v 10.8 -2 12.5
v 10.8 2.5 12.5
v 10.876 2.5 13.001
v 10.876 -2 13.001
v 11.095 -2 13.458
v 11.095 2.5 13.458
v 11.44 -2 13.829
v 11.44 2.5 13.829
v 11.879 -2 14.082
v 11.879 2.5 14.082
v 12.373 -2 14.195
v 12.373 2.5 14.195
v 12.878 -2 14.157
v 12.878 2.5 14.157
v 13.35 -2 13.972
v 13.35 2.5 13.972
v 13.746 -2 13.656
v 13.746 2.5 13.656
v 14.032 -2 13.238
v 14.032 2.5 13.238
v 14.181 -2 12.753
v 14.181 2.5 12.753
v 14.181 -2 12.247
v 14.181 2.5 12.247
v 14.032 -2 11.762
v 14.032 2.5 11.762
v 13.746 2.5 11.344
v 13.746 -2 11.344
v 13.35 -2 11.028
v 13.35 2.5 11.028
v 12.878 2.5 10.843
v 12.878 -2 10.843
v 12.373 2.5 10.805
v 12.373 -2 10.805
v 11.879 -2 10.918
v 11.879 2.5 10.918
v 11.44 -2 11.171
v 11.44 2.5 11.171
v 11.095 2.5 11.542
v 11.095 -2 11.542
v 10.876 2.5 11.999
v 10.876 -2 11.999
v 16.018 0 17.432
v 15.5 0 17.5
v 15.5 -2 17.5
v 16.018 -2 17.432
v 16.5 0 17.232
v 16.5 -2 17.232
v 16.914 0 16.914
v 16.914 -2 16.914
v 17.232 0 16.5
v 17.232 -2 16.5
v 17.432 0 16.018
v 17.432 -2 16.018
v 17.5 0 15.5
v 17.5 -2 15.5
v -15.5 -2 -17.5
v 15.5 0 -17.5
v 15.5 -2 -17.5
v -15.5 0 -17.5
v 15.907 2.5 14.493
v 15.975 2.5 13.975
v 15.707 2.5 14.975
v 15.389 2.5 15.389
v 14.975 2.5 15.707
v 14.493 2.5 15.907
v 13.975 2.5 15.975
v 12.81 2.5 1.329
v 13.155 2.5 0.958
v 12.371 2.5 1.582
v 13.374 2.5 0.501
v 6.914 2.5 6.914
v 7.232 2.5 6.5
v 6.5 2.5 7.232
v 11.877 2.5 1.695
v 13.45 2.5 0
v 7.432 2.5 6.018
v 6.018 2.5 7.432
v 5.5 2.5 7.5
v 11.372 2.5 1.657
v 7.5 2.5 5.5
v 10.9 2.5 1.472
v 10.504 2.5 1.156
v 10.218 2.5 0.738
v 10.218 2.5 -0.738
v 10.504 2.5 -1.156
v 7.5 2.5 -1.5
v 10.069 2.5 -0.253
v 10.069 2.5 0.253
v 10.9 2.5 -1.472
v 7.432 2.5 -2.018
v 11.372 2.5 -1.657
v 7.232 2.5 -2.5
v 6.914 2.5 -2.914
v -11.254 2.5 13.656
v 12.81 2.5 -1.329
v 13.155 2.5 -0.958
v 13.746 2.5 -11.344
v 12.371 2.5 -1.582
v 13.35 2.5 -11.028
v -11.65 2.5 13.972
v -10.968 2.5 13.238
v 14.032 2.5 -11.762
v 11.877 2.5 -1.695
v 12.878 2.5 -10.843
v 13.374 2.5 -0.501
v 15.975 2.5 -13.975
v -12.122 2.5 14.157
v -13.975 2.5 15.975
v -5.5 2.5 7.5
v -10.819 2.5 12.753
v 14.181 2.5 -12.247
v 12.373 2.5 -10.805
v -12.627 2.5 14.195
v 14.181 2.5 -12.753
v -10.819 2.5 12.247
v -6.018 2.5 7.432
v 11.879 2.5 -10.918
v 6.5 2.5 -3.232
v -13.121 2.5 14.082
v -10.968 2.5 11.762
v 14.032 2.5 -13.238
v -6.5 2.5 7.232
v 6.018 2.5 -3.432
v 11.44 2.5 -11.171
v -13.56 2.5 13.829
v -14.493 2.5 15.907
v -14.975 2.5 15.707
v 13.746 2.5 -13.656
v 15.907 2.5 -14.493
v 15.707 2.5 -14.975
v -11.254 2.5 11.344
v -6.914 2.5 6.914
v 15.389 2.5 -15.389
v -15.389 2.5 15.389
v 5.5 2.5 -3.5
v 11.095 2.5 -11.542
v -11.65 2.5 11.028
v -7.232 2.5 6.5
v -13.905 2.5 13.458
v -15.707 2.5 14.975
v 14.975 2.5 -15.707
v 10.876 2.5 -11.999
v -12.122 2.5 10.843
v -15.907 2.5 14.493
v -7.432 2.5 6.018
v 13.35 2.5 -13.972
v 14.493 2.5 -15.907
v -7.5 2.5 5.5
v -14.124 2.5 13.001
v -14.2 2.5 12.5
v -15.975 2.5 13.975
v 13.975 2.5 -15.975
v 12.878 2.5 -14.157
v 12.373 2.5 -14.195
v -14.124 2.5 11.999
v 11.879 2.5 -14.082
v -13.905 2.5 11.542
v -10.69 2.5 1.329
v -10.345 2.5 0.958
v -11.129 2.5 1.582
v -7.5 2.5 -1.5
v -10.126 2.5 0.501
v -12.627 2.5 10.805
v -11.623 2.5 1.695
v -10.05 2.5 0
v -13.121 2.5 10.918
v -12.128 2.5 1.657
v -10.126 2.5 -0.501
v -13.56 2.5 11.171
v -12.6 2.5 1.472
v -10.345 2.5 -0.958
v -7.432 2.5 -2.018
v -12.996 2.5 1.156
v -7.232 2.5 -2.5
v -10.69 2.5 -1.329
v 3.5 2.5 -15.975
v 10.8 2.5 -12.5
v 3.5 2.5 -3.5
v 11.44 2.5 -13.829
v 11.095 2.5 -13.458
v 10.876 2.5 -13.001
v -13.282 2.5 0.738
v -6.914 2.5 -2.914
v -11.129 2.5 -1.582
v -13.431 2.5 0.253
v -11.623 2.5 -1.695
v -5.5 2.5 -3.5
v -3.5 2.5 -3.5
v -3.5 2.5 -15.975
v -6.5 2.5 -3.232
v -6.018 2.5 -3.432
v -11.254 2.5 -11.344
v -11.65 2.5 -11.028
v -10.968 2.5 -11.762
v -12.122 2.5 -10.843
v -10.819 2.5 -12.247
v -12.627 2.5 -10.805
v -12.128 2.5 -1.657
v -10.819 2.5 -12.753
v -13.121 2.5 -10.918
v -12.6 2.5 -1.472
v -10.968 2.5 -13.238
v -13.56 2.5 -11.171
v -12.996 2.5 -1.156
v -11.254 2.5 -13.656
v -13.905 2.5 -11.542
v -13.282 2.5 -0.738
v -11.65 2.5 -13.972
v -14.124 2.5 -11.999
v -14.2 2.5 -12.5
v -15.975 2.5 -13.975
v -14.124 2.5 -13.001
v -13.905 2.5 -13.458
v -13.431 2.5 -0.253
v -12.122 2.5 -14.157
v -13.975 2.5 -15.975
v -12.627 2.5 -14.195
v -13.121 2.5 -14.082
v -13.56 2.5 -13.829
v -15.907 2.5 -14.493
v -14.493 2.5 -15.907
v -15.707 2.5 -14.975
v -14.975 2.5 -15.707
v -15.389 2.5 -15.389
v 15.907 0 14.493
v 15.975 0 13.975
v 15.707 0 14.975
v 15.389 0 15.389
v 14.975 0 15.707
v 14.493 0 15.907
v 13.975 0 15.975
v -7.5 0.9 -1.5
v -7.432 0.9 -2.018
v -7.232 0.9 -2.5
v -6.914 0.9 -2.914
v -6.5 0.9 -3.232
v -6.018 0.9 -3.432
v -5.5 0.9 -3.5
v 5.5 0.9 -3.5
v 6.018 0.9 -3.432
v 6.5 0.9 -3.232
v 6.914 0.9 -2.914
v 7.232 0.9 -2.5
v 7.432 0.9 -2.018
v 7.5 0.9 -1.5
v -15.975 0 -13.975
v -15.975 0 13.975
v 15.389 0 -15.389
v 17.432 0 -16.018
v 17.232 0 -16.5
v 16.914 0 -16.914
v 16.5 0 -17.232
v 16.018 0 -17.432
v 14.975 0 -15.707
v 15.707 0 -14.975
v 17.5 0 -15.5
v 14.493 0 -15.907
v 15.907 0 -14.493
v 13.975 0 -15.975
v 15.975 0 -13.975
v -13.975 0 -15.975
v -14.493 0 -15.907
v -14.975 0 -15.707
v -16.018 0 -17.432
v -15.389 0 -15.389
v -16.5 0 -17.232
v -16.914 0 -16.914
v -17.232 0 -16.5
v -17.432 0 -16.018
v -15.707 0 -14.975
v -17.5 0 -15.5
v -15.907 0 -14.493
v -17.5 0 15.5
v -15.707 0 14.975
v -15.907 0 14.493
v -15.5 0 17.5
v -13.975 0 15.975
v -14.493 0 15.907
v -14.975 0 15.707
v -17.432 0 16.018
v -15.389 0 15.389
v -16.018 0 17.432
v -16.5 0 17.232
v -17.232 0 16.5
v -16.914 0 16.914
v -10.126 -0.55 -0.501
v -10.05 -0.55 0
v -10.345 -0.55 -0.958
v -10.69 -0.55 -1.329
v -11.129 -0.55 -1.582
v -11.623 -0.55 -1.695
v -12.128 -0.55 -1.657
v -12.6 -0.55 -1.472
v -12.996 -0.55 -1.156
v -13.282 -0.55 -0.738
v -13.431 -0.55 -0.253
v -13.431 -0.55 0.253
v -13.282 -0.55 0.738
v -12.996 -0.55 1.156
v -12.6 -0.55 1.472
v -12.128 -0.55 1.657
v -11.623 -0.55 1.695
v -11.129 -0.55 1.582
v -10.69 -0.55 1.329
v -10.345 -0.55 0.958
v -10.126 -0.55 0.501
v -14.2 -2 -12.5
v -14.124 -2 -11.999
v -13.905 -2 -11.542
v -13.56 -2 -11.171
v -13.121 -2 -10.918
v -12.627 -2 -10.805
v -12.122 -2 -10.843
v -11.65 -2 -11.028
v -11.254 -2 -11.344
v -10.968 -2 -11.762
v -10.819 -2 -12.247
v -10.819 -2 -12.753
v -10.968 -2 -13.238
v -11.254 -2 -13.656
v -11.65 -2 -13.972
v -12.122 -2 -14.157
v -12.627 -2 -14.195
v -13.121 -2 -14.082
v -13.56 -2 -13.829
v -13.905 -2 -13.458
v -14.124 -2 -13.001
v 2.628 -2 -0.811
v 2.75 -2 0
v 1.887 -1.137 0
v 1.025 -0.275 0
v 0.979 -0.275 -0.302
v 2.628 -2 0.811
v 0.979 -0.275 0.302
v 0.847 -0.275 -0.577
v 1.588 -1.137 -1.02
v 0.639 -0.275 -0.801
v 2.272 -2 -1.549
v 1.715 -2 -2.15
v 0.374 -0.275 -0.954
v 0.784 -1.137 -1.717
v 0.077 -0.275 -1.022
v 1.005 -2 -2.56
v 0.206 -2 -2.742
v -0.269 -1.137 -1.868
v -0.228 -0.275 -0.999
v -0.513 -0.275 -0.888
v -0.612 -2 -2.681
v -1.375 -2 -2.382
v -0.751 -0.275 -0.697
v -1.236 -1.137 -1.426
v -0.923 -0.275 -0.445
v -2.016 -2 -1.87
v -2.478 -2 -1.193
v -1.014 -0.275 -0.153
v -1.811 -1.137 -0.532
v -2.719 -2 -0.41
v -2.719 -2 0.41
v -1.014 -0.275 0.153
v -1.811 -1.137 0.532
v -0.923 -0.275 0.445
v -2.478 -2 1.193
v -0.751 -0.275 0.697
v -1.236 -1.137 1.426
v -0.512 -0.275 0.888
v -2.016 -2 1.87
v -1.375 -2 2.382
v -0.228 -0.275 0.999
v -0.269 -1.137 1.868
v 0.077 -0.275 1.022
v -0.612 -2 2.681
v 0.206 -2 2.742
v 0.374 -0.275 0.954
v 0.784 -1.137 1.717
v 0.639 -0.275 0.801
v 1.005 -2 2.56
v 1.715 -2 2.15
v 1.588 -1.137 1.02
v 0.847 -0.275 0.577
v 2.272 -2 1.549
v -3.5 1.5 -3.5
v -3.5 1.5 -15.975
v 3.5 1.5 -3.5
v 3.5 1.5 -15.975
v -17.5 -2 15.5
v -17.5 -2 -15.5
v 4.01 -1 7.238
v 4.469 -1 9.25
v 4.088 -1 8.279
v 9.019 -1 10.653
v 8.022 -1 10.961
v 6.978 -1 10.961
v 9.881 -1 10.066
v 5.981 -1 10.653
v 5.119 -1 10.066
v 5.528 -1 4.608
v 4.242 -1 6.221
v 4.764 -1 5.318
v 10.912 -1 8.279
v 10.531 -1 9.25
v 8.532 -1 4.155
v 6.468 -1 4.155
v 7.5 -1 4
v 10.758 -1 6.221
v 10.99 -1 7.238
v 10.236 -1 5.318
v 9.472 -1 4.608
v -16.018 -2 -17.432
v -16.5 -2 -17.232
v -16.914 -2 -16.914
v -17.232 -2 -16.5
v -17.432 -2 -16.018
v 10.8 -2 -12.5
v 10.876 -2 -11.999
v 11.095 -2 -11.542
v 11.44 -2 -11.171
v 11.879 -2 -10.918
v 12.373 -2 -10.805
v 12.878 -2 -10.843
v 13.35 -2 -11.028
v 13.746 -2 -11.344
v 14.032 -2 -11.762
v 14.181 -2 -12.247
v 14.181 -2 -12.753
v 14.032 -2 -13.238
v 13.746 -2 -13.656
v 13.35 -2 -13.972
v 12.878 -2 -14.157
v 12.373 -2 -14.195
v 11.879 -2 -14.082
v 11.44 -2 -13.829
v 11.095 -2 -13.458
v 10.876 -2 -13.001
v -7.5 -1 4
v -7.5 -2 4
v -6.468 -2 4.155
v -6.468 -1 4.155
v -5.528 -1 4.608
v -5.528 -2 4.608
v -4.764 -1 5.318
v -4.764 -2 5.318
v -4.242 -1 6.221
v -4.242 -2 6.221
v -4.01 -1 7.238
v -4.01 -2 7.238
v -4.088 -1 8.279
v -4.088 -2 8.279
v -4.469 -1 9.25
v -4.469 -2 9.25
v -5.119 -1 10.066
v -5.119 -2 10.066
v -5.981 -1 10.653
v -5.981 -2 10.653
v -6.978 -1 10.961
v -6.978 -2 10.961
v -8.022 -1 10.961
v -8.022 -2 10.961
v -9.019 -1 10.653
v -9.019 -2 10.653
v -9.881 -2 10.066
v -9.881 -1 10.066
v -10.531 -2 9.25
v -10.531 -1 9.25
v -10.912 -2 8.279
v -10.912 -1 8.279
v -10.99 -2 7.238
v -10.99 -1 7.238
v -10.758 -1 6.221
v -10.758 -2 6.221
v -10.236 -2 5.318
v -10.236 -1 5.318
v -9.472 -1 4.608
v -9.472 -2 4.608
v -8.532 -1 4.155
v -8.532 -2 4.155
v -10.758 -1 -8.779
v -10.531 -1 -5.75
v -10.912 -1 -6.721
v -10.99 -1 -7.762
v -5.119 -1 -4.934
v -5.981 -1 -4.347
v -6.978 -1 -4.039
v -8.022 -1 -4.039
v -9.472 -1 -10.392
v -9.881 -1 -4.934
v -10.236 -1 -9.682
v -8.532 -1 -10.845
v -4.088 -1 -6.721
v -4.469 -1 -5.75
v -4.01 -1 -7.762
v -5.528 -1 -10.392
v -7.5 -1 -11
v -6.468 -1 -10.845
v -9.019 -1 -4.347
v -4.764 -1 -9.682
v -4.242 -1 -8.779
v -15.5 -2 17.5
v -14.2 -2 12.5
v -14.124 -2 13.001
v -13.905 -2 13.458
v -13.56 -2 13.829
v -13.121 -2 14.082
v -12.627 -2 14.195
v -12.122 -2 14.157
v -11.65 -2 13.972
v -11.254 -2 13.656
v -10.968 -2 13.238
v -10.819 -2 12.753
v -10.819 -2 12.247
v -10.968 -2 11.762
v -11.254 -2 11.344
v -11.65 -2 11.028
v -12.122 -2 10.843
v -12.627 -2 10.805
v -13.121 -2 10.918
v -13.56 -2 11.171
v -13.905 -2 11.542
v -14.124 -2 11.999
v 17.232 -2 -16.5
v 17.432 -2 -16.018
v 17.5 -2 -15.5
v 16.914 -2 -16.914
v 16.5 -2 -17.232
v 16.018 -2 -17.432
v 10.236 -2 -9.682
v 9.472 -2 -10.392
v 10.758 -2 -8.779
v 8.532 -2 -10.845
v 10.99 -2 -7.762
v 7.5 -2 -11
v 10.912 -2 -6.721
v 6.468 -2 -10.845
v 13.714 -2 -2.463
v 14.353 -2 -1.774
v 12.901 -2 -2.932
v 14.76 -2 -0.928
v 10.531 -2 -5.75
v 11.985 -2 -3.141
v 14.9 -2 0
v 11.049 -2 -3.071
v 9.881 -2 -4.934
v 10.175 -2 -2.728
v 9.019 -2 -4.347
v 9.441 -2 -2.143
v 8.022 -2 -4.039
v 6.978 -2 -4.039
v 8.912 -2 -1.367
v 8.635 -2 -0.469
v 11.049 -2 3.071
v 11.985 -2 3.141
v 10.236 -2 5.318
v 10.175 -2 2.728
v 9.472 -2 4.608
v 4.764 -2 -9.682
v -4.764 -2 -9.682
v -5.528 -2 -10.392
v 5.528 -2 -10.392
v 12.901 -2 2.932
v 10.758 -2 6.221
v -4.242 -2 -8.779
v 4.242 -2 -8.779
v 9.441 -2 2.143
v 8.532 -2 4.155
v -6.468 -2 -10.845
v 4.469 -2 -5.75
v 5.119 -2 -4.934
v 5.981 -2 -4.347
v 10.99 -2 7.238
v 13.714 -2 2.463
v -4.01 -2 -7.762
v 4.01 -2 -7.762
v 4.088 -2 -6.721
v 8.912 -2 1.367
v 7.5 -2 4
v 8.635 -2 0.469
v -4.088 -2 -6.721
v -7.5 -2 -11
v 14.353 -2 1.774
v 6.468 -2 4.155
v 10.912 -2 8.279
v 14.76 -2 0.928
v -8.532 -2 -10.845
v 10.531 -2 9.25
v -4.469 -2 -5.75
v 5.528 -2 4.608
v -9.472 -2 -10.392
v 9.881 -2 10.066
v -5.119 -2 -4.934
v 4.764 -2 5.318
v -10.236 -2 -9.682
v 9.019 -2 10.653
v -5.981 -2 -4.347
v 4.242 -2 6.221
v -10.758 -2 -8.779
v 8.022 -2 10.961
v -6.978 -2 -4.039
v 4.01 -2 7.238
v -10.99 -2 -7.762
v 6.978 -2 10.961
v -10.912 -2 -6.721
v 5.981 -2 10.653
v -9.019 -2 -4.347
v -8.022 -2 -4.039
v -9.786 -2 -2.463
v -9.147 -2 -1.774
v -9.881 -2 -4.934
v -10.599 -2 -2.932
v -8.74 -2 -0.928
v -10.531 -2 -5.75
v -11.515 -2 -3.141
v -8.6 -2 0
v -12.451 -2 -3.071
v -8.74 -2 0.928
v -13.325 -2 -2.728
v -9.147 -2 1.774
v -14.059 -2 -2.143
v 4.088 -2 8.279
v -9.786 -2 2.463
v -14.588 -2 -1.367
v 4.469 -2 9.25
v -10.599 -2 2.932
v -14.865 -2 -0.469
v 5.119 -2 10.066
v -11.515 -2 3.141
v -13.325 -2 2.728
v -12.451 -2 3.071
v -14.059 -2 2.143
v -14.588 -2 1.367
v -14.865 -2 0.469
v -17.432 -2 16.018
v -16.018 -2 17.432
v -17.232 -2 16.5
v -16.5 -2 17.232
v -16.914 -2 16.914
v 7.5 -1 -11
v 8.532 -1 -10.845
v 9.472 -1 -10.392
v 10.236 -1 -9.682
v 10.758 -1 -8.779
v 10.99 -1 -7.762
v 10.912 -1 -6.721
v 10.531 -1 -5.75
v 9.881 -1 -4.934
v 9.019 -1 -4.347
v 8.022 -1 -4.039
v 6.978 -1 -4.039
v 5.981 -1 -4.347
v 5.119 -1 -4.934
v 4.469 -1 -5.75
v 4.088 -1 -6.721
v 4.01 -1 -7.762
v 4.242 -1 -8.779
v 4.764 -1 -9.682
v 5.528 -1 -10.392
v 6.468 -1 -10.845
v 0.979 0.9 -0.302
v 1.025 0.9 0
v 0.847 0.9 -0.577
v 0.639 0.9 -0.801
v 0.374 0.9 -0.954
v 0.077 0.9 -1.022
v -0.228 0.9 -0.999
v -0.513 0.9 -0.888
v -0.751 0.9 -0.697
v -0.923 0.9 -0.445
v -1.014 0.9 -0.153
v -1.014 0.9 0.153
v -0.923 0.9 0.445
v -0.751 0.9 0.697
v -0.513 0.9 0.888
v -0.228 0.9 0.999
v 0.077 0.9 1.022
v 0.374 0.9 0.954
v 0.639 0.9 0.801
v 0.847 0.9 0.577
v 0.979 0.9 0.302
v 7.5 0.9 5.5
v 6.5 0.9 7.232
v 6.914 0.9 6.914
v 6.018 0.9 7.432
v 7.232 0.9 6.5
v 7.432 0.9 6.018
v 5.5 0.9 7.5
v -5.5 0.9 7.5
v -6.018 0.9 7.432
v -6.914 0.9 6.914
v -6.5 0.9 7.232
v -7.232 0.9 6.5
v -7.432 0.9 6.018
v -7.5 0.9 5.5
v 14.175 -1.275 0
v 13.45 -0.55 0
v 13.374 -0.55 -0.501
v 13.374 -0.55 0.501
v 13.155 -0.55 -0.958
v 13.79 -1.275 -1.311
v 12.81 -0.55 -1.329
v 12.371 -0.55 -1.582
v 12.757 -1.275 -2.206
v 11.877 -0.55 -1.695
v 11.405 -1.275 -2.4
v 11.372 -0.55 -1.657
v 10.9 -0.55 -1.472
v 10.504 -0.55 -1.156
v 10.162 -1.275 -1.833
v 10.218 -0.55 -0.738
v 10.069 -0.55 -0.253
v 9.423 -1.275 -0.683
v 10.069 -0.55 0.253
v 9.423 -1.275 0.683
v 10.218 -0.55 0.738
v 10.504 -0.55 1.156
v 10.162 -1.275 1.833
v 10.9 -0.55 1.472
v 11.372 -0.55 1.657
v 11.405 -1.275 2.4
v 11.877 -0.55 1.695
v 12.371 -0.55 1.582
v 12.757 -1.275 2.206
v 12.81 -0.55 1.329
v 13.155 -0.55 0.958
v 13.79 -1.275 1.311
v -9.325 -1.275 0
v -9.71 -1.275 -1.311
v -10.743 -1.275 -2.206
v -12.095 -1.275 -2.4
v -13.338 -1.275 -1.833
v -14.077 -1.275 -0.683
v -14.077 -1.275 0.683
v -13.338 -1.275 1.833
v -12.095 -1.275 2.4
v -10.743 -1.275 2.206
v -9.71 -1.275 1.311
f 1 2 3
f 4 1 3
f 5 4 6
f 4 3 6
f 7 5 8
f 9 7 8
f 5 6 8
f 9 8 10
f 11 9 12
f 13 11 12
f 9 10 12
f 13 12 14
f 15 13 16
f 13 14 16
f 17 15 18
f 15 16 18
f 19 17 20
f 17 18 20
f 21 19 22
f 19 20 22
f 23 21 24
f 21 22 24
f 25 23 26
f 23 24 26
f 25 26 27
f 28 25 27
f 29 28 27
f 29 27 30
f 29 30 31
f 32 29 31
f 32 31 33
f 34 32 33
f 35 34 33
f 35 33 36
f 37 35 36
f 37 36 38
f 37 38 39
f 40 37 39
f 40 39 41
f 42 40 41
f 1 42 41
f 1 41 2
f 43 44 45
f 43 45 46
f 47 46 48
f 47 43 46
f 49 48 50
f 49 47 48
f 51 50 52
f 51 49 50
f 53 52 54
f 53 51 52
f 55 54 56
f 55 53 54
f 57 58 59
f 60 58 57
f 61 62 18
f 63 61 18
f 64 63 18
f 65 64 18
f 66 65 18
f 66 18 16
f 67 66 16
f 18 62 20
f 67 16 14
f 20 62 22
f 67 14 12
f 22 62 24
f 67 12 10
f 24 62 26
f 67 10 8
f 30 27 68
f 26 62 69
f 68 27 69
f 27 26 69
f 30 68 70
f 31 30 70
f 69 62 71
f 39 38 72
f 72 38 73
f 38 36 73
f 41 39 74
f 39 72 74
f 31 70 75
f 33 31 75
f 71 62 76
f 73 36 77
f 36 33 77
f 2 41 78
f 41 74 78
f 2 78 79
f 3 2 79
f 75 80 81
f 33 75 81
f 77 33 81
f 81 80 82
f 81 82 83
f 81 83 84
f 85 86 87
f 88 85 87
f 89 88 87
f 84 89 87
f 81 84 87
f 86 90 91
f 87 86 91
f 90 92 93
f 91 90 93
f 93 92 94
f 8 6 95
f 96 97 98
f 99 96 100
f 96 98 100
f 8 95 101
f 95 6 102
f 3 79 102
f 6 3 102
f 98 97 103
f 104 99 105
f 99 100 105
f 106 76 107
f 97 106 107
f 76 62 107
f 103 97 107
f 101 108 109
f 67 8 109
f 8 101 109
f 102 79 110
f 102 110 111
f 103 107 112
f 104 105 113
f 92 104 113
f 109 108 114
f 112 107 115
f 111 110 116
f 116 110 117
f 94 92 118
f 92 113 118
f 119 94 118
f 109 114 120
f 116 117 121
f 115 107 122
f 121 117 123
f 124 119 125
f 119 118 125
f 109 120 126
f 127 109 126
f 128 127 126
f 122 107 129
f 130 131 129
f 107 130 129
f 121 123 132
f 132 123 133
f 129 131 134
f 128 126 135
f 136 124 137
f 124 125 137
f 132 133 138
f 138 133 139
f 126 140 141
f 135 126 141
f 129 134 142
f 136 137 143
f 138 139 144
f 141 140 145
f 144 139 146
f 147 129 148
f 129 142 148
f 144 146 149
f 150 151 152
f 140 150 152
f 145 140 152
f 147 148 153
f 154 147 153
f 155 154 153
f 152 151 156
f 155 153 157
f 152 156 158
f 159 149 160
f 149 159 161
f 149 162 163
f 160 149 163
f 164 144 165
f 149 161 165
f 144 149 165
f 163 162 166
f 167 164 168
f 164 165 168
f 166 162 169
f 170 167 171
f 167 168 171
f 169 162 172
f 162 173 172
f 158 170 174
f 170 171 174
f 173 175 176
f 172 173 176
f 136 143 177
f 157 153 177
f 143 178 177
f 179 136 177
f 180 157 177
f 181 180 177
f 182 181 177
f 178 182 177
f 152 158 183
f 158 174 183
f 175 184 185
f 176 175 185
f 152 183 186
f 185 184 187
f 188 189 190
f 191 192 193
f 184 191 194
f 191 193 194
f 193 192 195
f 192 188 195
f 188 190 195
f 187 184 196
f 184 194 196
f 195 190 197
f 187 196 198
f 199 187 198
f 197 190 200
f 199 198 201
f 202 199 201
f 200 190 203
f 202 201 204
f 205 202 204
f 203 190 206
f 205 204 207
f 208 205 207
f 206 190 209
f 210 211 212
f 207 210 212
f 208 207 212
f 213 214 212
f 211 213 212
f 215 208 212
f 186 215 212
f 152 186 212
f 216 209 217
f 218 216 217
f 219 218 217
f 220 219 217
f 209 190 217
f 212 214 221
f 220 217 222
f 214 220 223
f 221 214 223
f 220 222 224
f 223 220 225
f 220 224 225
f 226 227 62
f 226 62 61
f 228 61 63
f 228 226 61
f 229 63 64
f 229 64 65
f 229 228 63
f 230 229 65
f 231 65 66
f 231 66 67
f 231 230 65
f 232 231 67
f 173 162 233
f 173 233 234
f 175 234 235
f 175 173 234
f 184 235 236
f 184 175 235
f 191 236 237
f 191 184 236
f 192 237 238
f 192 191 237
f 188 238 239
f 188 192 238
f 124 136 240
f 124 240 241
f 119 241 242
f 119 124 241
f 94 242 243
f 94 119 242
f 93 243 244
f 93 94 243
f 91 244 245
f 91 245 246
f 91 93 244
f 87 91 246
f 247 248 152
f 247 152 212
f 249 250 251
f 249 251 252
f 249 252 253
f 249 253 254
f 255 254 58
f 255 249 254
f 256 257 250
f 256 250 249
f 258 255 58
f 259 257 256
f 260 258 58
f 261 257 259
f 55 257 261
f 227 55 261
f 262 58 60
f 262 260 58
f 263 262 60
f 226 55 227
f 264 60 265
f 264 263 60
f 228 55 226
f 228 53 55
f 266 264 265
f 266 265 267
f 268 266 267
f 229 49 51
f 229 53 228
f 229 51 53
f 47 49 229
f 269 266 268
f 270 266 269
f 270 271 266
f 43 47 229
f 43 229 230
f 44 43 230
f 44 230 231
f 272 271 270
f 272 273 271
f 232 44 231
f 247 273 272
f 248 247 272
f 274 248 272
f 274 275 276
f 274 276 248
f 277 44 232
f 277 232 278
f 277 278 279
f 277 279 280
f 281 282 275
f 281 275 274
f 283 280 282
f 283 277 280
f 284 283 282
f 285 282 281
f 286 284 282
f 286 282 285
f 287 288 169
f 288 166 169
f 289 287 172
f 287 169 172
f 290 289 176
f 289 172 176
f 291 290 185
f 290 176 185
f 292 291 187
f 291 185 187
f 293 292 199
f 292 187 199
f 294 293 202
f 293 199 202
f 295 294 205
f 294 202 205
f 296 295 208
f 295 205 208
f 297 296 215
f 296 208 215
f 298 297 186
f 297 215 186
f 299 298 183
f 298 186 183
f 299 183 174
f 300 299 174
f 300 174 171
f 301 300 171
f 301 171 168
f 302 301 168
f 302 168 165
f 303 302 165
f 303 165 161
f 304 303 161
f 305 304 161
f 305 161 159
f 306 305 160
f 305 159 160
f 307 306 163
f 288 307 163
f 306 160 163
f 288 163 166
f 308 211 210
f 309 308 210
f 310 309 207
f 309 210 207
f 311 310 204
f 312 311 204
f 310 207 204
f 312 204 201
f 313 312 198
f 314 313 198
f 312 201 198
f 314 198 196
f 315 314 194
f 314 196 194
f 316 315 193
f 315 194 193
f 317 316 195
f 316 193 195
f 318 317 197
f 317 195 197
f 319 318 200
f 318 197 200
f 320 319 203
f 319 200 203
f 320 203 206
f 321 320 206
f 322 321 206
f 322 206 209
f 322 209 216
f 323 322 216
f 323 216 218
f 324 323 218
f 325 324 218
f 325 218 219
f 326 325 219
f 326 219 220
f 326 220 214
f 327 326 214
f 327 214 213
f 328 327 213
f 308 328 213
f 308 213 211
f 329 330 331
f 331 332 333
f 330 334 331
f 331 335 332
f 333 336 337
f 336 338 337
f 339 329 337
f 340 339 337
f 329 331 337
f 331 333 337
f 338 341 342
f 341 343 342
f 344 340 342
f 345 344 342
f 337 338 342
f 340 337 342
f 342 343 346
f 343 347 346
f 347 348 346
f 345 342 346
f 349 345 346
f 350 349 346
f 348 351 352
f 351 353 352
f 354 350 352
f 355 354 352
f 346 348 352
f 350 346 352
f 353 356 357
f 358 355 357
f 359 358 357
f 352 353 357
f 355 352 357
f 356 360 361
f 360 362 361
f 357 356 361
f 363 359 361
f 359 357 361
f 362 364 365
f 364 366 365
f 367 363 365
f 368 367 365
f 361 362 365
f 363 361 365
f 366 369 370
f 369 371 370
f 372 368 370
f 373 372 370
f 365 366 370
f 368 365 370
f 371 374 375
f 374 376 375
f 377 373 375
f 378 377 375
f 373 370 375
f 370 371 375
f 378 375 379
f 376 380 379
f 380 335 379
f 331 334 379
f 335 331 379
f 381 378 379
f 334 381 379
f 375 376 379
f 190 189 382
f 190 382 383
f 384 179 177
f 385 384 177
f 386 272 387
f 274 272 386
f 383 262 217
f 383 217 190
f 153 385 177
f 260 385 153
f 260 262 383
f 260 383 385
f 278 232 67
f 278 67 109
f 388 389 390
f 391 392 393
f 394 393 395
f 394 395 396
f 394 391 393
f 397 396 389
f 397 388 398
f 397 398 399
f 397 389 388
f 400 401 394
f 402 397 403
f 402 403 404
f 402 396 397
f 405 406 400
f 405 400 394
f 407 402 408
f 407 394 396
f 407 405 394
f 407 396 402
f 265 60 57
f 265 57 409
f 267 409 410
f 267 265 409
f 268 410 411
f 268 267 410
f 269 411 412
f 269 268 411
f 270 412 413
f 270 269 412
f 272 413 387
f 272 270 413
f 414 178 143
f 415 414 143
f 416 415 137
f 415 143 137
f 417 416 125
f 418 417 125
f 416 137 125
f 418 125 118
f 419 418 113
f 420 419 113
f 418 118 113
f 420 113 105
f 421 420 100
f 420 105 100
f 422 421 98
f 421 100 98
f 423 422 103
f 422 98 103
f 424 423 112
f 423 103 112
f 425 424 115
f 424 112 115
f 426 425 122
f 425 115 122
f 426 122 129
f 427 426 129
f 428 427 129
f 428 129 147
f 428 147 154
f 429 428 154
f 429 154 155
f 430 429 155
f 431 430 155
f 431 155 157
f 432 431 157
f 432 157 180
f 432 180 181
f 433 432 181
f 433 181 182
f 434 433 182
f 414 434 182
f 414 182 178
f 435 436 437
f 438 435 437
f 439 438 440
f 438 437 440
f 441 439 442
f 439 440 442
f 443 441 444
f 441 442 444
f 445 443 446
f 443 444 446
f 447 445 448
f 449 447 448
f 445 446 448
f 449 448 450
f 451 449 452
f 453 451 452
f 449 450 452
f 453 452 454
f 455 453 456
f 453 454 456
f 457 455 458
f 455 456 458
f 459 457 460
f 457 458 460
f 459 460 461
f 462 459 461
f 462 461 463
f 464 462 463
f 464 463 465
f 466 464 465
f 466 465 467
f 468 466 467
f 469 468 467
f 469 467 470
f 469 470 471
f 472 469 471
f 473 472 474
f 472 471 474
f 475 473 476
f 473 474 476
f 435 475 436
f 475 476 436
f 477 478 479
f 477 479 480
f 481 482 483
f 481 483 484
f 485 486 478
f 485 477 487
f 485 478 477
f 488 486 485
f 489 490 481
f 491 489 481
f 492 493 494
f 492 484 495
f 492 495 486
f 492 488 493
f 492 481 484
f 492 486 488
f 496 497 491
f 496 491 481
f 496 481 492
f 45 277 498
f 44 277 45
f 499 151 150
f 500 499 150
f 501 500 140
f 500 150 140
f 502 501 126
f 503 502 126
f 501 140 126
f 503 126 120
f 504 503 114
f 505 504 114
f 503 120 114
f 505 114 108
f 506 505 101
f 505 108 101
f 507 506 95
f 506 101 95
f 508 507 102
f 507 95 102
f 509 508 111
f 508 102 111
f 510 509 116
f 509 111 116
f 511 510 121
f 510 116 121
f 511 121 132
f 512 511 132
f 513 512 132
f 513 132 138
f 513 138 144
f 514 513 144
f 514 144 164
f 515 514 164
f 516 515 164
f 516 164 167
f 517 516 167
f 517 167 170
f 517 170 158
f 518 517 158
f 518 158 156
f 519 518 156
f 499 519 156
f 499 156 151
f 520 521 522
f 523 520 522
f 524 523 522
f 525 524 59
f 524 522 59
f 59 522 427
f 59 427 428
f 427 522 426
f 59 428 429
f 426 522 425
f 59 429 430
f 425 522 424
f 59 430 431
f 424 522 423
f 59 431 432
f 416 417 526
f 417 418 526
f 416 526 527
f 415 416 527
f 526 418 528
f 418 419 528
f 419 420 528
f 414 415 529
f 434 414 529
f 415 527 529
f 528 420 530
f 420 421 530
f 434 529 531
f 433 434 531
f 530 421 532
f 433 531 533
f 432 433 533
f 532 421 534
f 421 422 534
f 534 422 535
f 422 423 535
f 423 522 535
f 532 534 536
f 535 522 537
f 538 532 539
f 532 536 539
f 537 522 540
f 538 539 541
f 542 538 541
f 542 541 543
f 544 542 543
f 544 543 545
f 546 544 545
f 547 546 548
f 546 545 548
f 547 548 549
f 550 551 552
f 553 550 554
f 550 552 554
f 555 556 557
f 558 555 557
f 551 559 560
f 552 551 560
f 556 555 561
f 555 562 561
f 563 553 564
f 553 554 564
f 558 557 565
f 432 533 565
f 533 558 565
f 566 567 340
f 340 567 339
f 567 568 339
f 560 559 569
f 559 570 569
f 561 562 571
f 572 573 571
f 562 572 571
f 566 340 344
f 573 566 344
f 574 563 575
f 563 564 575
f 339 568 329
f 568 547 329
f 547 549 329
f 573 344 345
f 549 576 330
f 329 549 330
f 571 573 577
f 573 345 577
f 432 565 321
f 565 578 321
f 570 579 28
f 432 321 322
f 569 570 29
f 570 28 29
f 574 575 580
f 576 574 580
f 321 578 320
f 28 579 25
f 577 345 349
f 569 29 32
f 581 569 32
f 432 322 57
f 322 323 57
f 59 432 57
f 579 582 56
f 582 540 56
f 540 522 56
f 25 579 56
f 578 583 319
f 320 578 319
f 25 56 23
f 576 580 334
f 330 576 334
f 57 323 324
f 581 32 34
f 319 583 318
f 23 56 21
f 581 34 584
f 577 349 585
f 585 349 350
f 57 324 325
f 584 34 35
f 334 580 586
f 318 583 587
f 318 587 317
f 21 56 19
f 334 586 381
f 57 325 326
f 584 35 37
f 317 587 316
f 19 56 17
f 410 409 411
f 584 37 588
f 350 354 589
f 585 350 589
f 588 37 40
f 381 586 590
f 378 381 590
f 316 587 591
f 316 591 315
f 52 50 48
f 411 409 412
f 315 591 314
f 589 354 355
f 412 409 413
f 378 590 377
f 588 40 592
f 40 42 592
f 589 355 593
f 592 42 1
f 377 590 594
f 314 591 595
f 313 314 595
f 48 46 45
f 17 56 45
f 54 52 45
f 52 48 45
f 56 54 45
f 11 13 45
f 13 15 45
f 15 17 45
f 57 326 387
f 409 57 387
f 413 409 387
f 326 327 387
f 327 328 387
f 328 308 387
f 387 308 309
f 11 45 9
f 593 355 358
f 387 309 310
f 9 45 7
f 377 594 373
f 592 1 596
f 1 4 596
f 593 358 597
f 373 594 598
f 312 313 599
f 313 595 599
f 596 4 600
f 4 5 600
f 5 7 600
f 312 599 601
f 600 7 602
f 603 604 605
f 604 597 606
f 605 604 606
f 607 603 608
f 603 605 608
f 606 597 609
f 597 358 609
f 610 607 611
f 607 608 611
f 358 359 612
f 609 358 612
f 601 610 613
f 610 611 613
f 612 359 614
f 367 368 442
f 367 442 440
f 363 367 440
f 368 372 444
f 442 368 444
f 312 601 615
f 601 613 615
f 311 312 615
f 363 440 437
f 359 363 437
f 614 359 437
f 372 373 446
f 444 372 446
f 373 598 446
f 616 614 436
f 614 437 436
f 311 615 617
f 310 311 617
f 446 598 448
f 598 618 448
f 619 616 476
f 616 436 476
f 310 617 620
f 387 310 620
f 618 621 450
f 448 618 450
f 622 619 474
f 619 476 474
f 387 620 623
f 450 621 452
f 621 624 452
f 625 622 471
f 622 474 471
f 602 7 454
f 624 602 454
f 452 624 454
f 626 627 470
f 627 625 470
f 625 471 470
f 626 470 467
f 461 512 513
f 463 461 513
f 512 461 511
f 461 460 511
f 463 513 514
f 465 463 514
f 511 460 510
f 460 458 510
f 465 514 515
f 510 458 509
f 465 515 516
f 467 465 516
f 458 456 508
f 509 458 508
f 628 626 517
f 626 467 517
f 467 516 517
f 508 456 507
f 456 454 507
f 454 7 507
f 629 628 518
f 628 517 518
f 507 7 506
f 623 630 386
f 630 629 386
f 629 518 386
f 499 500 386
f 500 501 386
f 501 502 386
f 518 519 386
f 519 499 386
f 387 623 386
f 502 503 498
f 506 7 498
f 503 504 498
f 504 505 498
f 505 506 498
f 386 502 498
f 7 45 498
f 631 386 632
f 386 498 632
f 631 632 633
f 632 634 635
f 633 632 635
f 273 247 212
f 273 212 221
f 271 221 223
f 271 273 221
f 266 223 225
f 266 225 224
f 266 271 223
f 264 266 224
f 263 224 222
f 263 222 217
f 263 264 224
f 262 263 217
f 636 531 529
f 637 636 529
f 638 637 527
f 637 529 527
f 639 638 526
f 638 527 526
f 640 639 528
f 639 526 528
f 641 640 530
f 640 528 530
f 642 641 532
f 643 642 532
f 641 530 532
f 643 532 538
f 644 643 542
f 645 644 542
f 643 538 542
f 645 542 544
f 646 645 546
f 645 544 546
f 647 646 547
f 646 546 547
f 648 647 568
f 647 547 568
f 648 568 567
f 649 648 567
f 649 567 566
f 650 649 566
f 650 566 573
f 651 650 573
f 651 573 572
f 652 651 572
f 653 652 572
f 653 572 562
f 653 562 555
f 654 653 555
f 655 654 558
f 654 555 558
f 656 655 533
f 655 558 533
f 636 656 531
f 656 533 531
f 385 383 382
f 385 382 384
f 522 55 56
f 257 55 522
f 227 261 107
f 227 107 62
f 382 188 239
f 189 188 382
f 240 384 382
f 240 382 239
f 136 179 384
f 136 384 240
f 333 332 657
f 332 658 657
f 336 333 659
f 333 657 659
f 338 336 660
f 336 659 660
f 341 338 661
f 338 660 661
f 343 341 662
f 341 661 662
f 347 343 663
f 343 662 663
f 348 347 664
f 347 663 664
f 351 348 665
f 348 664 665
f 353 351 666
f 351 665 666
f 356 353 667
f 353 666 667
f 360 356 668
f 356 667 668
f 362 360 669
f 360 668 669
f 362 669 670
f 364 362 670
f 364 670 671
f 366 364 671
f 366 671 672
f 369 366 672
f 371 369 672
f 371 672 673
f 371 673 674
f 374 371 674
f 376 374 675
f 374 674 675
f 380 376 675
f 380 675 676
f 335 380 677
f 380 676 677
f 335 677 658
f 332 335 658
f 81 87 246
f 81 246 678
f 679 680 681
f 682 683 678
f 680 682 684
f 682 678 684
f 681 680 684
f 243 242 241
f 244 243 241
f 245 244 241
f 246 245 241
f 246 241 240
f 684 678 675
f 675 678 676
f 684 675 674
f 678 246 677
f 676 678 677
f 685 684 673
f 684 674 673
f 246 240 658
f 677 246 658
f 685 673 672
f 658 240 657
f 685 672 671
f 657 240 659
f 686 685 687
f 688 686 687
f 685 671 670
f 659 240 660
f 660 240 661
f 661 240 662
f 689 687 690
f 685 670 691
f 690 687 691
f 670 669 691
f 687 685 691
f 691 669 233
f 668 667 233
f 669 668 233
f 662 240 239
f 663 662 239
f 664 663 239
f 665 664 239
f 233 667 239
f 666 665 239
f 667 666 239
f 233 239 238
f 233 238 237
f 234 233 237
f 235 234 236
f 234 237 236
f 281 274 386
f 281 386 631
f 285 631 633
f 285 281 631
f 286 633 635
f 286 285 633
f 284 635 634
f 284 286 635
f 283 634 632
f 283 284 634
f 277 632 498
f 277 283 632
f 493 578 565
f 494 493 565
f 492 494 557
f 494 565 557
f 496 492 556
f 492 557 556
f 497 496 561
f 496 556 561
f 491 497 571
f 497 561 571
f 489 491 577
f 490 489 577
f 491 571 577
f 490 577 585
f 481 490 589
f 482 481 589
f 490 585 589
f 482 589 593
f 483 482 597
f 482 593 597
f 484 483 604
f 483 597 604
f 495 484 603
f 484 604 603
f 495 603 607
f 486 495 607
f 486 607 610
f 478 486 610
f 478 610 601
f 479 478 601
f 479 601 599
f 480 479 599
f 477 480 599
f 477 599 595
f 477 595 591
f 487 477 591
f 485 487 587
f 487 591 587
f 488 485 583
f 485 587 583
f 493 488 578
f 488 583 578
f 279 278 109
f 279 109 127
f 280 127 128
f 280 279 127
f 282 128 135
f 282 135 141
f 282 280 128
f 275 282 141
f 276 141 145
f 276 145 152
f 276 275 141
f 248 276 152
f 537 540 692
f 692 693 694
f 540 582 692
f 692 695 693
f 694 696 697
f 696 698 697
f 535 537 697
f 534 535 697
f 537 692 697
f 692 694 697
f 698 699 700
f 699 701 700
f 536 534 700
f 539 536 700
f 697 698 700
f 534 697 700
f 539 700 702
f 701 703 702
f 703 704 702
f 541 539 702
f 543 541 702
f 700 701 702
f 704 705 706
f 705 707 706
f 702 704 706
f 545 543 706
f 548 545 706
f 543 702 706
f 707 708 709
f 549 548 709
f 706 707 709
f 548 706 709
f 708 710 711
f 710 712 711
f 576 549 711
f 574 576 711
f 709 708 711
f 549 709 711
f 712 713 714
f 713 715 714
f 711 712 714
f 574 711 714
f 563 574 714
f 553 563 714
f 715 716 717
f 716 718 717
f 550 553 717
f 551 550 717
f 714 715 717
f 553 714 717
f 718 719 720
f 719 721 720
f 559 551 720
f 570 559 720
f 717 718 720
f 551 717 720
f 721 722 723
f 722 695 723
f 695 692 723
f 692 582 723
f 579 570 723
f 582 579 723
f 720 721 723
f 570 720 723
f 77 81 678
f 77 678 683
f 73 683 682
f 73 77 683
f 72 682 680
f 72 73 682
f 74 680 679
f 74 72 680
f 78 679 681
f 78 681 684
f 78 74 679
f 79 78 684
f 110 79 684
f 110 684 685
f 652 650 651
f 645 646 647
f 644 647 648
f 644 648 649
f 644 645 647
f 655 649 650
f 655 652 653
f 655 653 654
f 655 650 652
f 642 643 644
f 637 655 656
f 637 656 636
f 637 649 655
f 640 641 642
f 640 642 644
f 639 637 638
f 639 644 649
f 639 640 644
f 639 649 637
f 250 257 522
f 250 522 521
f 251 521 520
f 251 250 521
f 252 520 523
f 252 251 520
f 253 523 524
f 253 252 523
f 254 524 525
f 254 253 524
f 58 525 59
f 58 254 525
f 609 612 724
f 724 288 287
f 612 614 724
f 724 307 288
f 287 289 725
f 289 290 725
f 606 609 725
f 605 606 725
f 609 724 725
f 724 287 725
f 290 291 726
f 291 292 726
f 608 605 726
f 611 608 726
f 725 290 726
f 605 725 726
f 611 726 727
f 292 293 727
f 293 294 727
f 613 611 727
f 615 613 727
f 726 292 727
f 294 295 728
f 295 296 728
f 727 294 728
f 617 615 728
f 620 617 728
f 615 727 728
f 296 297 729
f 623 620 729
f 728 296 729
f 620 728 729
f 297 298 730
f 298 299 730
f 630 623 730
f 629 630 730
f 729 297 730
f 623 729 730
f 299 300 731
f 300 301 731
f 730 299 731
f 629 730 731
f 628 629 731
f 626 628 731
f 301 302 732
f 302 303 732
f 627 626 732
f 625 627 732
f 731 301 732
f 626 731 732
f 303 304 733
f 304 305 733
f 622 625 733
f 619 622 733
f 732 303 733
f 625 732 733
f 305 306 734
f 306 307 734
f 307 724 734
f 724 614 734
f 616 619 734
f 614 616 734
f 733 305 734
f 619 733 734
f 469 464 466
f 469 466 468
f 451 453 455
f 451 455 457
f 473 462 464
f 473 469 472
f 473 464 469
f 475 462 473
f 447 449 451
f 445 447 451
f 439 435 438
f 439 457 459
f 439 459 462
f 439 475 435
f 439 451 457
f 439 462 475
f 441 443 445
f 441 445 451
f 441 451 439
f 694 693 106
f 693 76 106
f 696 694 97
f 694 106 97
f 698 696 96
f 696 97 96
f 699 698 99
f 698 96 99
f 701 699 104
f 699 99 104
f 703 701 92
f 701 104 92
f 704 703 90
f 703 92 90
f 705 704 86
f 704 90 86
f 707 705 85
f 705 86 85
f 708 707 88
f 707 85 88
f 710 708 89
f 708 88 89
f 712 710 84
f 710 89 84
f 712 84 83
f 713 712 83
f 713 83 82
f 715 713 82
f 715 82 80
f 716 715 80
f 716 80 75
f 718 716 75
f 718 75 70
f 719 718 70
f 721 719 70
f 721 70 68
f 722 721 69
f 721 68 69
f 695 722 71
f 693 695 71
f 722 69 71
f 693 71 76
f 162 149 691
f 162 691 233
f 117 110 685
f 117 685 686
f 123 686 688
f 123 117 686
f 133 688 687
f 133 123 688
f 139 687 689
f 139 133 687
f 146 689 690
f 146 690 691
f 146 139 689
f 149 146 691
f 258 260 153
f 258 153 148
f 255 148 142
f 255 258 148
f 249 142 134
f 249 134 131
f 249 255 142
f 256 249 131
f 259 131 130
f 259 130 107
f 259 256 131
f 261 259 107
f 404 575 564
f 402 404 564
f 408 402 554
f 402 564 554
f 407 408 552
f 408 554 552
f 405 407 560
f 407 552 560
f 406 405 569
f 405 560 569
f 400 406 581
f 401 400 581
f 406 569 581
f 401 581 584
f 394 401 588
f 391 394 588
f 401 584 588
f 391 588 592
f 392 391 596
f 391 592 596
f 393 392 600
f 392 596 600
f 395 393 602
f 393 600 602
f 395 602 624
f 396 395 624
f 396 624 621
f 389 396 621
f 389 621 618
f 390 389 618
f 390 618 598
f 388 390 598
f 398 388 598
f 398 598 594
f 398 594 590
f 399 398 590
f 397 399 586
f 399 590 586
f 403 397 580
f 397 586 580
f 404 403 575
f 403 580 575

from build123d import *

# Parameters (mm, degrees)
EXTRUDE_1_DEPTH              = 2.5
EXTRUDE_2_DEPTH              = 2
HOLE_WIZARD_3_4_D            = 3.4
CUT_EXTRUDE_2193_DEPTH       = 1.6
HOLE_WIZARD_3_D              = 3.4
HOLE_WIZARD_3_CSINK_D        = 6.3
HOLE_WIZARD_3_CSINK_ANGLE    = 90
SKETCH_8_W                   = 7
SKETCH_8_H                   = 12.475
CUT_EXTRUDE_3485_DEPTH       = 1
SKETCH_11_R                  = 3.5
CUT_EXTRUDE_7_1_DEPTH        = 1
HOLE_WIZARD_M2_5_D           = 2.05
HOLE_WIZARD_M2_5_CSINK_D     = 5.5
HOLE_WIZARD_M2_5_CSINK_ANGLE = 90


with BuildPart() as part:
    # Эскиз1 → Бобышка-Вытянуть1 (new body)
    with BuildSketch(Plane(origin=(0, 0, 0), x_dir=(1, 0, 0), z_dir=(0, 1, 0))):
        with BuildLine():
            Line((-13.975, 15.975), (13.975, 15.975))
            ThreePointArc((13.975, 15.975), (15.389213562, 15.389213562), (15.975, 13.975))
            Line((15.975, 13.975), (15.975, -13.975))
            ThreePointArc((15.975, -13.975), (15.389213562, -15.389213562), (13.975, -15.975))
            Line((13.975, -15.975), (-13.975, -15.975))
            ThreePointArc((-13.975, -15.975), (-15.389213562, -15.389213562), (-15.975, -13.975))
            Line((-15.975, -13.975), (-15.975, 13.975))
            ThreePointArc((-15.975, 13.975), (-15.389213562, 15.389213562), (-13.975, 15.975))
        make_face()
    extrude(amount=EXTRUDE_1_DEPTH)

    # Эскиз9 → Бобышка-Вытянуть2 (add)
    with BuildSketch(Plane.XZ):
        with BuildLine():
            Line((-15.5, 17.5), (15.5, 17.5))
            ThreePointArc((15.5, 17.5), (16.914213562, 16.914213562), (17.5, 15.5))
            Line((17.5, 15.5), (17.5, -15.5))
            ThreePointArc((17.5, -15.5), (16.914213562, -16.914213562), (15.5, -17.5))
            Line((15.5, -17.5), (-15.5, -17.5))
            ThreePointArc((-15.5, -17.5), (-16.914213562, -16.914213562), (-17.5, -15.5))
            Line((-17.5, -15.5), (-17.5, 15.5))
            ThreePointArc((-17.5, 15.5), (-16.914213562, 16.914213562), (-15.5, 17.5))
        make_face()
    extrude(amount=EXTRUDE_2_DEPTH)

    # Диаметр отверстия Ø3.4 (through all)
    with Locations(Plane.XZ.offset(2)):
        with Locations((-12.5, -12.5), (12.5, -12.5), (12.5, 12.5), (-12.5, 12.5)):
            Hole(HOLE_WIZARD_3_4_D / 2)

    # Эскиз4 → Cut-Extrude 2193 (cut)
    with BuildSketch(Plane(origin=(0, 2.5, 0), x_dir=(1, 0, 0), z_dir=(0, 1, 0))):
        with BuildLine():
            Line((-5.5, 3.5), (5.5, 3.5))
            ThreePointArc((5.5, 3.5), (6.914213562, 2.914213562), (7.5, 1.5))
            Line((7.5, 1.5), (7.5, -5.5))
            ThreePointArc((7.5, -5.5), (6.914213562, -6.914213562), (5.5, -7.5))
            Line((5.5, -7.5), (-5.5, -7.5))
            ThreePointArc((-5.5, -7.5), (-6.914213562, -6.914213562), (-7.5, -5.5))
            Line((-7.5, -5.5), (-7.5, 1.5))
            ThreePointArc((-7.5, 1.5), (-6.914213562, 2.914213562), (-5.5, 3.5))
        make_face()
    extrude(amount=-CUT_EXTRUDE_2193_DEPTH, mode=Mode.SUBTRACT)

    # Крепление дна М3 (through all)
    with Locations(Plane(origin=(0, -2, 0), x_dir=(-1, 0, 0), z_dir=(0, -1, 0))):
        with Locations((11.75, 0), (-11.75, 0)):
            CounterSinkHole(HOLE_WIZARD_3_D / 2, HOLE_WIZARD_3_CSINK_D / 2, counter_sink_angle=HOLE_WIZARD_3_CSINK_ANGLE)

    # Эскиз8 → Cut-Extrude 3485 (cut)
    with BuildSketch(Plane(origin=(0, 2.5, 0), x_dir=(1, 0, 0), z_dir=(0, 1, 0))):
        with Locations((0, 9.7375)):
            Rectangle(SKETCH_8_W, SKETCH_8_H)
    extrude(amount=-CUT_EXTRUDE_3485_DEPTH, mode=Mode.SUBTRACT)

    # Эскиз11 → Вырез магнитов 7*1 (cut)
    with BuildSketch(Plane.XZ.offset(2)):
        with Locations(Location((-7.5, 7.5, 0), (0, 0, 270))):
            Circle(SKETCH_11_R)
        with Locations(Location((7.5, 7.5, 0), (0, 0, 270))):
            Circle(SKETCH_11_R)
        with Locations(Location((-7.5, -7.5, 0), (0, 0, 270))):
            Circle(SKETCH_11_R)
        with Locations(Location((7.5, -7.5, 0), (0, 0, 270))):
            Circle(SKETCH_11_R)
    extrude(amount=-CUT_EXTRUDE_7_1_DEPTH, mode=Mode.SUBTRACT)

    # Отверстие для настройки M2.5 (through all)
    with Locations(Plane(origin=(0, -2, 0), x_dir=(-1, 0, 0), z_dir=(0, -1, 0))):
        with Locations((0, 0)):
            CounterSinkHole(HOLE_WIZARD_M2_5_D / 2, HOLE_WIZARD_M2_5_CSINK_D / 2, counter_sink_angle=HOLE_WIZARD_M2_5_CSINK_ANGLE)


solid = part.part
